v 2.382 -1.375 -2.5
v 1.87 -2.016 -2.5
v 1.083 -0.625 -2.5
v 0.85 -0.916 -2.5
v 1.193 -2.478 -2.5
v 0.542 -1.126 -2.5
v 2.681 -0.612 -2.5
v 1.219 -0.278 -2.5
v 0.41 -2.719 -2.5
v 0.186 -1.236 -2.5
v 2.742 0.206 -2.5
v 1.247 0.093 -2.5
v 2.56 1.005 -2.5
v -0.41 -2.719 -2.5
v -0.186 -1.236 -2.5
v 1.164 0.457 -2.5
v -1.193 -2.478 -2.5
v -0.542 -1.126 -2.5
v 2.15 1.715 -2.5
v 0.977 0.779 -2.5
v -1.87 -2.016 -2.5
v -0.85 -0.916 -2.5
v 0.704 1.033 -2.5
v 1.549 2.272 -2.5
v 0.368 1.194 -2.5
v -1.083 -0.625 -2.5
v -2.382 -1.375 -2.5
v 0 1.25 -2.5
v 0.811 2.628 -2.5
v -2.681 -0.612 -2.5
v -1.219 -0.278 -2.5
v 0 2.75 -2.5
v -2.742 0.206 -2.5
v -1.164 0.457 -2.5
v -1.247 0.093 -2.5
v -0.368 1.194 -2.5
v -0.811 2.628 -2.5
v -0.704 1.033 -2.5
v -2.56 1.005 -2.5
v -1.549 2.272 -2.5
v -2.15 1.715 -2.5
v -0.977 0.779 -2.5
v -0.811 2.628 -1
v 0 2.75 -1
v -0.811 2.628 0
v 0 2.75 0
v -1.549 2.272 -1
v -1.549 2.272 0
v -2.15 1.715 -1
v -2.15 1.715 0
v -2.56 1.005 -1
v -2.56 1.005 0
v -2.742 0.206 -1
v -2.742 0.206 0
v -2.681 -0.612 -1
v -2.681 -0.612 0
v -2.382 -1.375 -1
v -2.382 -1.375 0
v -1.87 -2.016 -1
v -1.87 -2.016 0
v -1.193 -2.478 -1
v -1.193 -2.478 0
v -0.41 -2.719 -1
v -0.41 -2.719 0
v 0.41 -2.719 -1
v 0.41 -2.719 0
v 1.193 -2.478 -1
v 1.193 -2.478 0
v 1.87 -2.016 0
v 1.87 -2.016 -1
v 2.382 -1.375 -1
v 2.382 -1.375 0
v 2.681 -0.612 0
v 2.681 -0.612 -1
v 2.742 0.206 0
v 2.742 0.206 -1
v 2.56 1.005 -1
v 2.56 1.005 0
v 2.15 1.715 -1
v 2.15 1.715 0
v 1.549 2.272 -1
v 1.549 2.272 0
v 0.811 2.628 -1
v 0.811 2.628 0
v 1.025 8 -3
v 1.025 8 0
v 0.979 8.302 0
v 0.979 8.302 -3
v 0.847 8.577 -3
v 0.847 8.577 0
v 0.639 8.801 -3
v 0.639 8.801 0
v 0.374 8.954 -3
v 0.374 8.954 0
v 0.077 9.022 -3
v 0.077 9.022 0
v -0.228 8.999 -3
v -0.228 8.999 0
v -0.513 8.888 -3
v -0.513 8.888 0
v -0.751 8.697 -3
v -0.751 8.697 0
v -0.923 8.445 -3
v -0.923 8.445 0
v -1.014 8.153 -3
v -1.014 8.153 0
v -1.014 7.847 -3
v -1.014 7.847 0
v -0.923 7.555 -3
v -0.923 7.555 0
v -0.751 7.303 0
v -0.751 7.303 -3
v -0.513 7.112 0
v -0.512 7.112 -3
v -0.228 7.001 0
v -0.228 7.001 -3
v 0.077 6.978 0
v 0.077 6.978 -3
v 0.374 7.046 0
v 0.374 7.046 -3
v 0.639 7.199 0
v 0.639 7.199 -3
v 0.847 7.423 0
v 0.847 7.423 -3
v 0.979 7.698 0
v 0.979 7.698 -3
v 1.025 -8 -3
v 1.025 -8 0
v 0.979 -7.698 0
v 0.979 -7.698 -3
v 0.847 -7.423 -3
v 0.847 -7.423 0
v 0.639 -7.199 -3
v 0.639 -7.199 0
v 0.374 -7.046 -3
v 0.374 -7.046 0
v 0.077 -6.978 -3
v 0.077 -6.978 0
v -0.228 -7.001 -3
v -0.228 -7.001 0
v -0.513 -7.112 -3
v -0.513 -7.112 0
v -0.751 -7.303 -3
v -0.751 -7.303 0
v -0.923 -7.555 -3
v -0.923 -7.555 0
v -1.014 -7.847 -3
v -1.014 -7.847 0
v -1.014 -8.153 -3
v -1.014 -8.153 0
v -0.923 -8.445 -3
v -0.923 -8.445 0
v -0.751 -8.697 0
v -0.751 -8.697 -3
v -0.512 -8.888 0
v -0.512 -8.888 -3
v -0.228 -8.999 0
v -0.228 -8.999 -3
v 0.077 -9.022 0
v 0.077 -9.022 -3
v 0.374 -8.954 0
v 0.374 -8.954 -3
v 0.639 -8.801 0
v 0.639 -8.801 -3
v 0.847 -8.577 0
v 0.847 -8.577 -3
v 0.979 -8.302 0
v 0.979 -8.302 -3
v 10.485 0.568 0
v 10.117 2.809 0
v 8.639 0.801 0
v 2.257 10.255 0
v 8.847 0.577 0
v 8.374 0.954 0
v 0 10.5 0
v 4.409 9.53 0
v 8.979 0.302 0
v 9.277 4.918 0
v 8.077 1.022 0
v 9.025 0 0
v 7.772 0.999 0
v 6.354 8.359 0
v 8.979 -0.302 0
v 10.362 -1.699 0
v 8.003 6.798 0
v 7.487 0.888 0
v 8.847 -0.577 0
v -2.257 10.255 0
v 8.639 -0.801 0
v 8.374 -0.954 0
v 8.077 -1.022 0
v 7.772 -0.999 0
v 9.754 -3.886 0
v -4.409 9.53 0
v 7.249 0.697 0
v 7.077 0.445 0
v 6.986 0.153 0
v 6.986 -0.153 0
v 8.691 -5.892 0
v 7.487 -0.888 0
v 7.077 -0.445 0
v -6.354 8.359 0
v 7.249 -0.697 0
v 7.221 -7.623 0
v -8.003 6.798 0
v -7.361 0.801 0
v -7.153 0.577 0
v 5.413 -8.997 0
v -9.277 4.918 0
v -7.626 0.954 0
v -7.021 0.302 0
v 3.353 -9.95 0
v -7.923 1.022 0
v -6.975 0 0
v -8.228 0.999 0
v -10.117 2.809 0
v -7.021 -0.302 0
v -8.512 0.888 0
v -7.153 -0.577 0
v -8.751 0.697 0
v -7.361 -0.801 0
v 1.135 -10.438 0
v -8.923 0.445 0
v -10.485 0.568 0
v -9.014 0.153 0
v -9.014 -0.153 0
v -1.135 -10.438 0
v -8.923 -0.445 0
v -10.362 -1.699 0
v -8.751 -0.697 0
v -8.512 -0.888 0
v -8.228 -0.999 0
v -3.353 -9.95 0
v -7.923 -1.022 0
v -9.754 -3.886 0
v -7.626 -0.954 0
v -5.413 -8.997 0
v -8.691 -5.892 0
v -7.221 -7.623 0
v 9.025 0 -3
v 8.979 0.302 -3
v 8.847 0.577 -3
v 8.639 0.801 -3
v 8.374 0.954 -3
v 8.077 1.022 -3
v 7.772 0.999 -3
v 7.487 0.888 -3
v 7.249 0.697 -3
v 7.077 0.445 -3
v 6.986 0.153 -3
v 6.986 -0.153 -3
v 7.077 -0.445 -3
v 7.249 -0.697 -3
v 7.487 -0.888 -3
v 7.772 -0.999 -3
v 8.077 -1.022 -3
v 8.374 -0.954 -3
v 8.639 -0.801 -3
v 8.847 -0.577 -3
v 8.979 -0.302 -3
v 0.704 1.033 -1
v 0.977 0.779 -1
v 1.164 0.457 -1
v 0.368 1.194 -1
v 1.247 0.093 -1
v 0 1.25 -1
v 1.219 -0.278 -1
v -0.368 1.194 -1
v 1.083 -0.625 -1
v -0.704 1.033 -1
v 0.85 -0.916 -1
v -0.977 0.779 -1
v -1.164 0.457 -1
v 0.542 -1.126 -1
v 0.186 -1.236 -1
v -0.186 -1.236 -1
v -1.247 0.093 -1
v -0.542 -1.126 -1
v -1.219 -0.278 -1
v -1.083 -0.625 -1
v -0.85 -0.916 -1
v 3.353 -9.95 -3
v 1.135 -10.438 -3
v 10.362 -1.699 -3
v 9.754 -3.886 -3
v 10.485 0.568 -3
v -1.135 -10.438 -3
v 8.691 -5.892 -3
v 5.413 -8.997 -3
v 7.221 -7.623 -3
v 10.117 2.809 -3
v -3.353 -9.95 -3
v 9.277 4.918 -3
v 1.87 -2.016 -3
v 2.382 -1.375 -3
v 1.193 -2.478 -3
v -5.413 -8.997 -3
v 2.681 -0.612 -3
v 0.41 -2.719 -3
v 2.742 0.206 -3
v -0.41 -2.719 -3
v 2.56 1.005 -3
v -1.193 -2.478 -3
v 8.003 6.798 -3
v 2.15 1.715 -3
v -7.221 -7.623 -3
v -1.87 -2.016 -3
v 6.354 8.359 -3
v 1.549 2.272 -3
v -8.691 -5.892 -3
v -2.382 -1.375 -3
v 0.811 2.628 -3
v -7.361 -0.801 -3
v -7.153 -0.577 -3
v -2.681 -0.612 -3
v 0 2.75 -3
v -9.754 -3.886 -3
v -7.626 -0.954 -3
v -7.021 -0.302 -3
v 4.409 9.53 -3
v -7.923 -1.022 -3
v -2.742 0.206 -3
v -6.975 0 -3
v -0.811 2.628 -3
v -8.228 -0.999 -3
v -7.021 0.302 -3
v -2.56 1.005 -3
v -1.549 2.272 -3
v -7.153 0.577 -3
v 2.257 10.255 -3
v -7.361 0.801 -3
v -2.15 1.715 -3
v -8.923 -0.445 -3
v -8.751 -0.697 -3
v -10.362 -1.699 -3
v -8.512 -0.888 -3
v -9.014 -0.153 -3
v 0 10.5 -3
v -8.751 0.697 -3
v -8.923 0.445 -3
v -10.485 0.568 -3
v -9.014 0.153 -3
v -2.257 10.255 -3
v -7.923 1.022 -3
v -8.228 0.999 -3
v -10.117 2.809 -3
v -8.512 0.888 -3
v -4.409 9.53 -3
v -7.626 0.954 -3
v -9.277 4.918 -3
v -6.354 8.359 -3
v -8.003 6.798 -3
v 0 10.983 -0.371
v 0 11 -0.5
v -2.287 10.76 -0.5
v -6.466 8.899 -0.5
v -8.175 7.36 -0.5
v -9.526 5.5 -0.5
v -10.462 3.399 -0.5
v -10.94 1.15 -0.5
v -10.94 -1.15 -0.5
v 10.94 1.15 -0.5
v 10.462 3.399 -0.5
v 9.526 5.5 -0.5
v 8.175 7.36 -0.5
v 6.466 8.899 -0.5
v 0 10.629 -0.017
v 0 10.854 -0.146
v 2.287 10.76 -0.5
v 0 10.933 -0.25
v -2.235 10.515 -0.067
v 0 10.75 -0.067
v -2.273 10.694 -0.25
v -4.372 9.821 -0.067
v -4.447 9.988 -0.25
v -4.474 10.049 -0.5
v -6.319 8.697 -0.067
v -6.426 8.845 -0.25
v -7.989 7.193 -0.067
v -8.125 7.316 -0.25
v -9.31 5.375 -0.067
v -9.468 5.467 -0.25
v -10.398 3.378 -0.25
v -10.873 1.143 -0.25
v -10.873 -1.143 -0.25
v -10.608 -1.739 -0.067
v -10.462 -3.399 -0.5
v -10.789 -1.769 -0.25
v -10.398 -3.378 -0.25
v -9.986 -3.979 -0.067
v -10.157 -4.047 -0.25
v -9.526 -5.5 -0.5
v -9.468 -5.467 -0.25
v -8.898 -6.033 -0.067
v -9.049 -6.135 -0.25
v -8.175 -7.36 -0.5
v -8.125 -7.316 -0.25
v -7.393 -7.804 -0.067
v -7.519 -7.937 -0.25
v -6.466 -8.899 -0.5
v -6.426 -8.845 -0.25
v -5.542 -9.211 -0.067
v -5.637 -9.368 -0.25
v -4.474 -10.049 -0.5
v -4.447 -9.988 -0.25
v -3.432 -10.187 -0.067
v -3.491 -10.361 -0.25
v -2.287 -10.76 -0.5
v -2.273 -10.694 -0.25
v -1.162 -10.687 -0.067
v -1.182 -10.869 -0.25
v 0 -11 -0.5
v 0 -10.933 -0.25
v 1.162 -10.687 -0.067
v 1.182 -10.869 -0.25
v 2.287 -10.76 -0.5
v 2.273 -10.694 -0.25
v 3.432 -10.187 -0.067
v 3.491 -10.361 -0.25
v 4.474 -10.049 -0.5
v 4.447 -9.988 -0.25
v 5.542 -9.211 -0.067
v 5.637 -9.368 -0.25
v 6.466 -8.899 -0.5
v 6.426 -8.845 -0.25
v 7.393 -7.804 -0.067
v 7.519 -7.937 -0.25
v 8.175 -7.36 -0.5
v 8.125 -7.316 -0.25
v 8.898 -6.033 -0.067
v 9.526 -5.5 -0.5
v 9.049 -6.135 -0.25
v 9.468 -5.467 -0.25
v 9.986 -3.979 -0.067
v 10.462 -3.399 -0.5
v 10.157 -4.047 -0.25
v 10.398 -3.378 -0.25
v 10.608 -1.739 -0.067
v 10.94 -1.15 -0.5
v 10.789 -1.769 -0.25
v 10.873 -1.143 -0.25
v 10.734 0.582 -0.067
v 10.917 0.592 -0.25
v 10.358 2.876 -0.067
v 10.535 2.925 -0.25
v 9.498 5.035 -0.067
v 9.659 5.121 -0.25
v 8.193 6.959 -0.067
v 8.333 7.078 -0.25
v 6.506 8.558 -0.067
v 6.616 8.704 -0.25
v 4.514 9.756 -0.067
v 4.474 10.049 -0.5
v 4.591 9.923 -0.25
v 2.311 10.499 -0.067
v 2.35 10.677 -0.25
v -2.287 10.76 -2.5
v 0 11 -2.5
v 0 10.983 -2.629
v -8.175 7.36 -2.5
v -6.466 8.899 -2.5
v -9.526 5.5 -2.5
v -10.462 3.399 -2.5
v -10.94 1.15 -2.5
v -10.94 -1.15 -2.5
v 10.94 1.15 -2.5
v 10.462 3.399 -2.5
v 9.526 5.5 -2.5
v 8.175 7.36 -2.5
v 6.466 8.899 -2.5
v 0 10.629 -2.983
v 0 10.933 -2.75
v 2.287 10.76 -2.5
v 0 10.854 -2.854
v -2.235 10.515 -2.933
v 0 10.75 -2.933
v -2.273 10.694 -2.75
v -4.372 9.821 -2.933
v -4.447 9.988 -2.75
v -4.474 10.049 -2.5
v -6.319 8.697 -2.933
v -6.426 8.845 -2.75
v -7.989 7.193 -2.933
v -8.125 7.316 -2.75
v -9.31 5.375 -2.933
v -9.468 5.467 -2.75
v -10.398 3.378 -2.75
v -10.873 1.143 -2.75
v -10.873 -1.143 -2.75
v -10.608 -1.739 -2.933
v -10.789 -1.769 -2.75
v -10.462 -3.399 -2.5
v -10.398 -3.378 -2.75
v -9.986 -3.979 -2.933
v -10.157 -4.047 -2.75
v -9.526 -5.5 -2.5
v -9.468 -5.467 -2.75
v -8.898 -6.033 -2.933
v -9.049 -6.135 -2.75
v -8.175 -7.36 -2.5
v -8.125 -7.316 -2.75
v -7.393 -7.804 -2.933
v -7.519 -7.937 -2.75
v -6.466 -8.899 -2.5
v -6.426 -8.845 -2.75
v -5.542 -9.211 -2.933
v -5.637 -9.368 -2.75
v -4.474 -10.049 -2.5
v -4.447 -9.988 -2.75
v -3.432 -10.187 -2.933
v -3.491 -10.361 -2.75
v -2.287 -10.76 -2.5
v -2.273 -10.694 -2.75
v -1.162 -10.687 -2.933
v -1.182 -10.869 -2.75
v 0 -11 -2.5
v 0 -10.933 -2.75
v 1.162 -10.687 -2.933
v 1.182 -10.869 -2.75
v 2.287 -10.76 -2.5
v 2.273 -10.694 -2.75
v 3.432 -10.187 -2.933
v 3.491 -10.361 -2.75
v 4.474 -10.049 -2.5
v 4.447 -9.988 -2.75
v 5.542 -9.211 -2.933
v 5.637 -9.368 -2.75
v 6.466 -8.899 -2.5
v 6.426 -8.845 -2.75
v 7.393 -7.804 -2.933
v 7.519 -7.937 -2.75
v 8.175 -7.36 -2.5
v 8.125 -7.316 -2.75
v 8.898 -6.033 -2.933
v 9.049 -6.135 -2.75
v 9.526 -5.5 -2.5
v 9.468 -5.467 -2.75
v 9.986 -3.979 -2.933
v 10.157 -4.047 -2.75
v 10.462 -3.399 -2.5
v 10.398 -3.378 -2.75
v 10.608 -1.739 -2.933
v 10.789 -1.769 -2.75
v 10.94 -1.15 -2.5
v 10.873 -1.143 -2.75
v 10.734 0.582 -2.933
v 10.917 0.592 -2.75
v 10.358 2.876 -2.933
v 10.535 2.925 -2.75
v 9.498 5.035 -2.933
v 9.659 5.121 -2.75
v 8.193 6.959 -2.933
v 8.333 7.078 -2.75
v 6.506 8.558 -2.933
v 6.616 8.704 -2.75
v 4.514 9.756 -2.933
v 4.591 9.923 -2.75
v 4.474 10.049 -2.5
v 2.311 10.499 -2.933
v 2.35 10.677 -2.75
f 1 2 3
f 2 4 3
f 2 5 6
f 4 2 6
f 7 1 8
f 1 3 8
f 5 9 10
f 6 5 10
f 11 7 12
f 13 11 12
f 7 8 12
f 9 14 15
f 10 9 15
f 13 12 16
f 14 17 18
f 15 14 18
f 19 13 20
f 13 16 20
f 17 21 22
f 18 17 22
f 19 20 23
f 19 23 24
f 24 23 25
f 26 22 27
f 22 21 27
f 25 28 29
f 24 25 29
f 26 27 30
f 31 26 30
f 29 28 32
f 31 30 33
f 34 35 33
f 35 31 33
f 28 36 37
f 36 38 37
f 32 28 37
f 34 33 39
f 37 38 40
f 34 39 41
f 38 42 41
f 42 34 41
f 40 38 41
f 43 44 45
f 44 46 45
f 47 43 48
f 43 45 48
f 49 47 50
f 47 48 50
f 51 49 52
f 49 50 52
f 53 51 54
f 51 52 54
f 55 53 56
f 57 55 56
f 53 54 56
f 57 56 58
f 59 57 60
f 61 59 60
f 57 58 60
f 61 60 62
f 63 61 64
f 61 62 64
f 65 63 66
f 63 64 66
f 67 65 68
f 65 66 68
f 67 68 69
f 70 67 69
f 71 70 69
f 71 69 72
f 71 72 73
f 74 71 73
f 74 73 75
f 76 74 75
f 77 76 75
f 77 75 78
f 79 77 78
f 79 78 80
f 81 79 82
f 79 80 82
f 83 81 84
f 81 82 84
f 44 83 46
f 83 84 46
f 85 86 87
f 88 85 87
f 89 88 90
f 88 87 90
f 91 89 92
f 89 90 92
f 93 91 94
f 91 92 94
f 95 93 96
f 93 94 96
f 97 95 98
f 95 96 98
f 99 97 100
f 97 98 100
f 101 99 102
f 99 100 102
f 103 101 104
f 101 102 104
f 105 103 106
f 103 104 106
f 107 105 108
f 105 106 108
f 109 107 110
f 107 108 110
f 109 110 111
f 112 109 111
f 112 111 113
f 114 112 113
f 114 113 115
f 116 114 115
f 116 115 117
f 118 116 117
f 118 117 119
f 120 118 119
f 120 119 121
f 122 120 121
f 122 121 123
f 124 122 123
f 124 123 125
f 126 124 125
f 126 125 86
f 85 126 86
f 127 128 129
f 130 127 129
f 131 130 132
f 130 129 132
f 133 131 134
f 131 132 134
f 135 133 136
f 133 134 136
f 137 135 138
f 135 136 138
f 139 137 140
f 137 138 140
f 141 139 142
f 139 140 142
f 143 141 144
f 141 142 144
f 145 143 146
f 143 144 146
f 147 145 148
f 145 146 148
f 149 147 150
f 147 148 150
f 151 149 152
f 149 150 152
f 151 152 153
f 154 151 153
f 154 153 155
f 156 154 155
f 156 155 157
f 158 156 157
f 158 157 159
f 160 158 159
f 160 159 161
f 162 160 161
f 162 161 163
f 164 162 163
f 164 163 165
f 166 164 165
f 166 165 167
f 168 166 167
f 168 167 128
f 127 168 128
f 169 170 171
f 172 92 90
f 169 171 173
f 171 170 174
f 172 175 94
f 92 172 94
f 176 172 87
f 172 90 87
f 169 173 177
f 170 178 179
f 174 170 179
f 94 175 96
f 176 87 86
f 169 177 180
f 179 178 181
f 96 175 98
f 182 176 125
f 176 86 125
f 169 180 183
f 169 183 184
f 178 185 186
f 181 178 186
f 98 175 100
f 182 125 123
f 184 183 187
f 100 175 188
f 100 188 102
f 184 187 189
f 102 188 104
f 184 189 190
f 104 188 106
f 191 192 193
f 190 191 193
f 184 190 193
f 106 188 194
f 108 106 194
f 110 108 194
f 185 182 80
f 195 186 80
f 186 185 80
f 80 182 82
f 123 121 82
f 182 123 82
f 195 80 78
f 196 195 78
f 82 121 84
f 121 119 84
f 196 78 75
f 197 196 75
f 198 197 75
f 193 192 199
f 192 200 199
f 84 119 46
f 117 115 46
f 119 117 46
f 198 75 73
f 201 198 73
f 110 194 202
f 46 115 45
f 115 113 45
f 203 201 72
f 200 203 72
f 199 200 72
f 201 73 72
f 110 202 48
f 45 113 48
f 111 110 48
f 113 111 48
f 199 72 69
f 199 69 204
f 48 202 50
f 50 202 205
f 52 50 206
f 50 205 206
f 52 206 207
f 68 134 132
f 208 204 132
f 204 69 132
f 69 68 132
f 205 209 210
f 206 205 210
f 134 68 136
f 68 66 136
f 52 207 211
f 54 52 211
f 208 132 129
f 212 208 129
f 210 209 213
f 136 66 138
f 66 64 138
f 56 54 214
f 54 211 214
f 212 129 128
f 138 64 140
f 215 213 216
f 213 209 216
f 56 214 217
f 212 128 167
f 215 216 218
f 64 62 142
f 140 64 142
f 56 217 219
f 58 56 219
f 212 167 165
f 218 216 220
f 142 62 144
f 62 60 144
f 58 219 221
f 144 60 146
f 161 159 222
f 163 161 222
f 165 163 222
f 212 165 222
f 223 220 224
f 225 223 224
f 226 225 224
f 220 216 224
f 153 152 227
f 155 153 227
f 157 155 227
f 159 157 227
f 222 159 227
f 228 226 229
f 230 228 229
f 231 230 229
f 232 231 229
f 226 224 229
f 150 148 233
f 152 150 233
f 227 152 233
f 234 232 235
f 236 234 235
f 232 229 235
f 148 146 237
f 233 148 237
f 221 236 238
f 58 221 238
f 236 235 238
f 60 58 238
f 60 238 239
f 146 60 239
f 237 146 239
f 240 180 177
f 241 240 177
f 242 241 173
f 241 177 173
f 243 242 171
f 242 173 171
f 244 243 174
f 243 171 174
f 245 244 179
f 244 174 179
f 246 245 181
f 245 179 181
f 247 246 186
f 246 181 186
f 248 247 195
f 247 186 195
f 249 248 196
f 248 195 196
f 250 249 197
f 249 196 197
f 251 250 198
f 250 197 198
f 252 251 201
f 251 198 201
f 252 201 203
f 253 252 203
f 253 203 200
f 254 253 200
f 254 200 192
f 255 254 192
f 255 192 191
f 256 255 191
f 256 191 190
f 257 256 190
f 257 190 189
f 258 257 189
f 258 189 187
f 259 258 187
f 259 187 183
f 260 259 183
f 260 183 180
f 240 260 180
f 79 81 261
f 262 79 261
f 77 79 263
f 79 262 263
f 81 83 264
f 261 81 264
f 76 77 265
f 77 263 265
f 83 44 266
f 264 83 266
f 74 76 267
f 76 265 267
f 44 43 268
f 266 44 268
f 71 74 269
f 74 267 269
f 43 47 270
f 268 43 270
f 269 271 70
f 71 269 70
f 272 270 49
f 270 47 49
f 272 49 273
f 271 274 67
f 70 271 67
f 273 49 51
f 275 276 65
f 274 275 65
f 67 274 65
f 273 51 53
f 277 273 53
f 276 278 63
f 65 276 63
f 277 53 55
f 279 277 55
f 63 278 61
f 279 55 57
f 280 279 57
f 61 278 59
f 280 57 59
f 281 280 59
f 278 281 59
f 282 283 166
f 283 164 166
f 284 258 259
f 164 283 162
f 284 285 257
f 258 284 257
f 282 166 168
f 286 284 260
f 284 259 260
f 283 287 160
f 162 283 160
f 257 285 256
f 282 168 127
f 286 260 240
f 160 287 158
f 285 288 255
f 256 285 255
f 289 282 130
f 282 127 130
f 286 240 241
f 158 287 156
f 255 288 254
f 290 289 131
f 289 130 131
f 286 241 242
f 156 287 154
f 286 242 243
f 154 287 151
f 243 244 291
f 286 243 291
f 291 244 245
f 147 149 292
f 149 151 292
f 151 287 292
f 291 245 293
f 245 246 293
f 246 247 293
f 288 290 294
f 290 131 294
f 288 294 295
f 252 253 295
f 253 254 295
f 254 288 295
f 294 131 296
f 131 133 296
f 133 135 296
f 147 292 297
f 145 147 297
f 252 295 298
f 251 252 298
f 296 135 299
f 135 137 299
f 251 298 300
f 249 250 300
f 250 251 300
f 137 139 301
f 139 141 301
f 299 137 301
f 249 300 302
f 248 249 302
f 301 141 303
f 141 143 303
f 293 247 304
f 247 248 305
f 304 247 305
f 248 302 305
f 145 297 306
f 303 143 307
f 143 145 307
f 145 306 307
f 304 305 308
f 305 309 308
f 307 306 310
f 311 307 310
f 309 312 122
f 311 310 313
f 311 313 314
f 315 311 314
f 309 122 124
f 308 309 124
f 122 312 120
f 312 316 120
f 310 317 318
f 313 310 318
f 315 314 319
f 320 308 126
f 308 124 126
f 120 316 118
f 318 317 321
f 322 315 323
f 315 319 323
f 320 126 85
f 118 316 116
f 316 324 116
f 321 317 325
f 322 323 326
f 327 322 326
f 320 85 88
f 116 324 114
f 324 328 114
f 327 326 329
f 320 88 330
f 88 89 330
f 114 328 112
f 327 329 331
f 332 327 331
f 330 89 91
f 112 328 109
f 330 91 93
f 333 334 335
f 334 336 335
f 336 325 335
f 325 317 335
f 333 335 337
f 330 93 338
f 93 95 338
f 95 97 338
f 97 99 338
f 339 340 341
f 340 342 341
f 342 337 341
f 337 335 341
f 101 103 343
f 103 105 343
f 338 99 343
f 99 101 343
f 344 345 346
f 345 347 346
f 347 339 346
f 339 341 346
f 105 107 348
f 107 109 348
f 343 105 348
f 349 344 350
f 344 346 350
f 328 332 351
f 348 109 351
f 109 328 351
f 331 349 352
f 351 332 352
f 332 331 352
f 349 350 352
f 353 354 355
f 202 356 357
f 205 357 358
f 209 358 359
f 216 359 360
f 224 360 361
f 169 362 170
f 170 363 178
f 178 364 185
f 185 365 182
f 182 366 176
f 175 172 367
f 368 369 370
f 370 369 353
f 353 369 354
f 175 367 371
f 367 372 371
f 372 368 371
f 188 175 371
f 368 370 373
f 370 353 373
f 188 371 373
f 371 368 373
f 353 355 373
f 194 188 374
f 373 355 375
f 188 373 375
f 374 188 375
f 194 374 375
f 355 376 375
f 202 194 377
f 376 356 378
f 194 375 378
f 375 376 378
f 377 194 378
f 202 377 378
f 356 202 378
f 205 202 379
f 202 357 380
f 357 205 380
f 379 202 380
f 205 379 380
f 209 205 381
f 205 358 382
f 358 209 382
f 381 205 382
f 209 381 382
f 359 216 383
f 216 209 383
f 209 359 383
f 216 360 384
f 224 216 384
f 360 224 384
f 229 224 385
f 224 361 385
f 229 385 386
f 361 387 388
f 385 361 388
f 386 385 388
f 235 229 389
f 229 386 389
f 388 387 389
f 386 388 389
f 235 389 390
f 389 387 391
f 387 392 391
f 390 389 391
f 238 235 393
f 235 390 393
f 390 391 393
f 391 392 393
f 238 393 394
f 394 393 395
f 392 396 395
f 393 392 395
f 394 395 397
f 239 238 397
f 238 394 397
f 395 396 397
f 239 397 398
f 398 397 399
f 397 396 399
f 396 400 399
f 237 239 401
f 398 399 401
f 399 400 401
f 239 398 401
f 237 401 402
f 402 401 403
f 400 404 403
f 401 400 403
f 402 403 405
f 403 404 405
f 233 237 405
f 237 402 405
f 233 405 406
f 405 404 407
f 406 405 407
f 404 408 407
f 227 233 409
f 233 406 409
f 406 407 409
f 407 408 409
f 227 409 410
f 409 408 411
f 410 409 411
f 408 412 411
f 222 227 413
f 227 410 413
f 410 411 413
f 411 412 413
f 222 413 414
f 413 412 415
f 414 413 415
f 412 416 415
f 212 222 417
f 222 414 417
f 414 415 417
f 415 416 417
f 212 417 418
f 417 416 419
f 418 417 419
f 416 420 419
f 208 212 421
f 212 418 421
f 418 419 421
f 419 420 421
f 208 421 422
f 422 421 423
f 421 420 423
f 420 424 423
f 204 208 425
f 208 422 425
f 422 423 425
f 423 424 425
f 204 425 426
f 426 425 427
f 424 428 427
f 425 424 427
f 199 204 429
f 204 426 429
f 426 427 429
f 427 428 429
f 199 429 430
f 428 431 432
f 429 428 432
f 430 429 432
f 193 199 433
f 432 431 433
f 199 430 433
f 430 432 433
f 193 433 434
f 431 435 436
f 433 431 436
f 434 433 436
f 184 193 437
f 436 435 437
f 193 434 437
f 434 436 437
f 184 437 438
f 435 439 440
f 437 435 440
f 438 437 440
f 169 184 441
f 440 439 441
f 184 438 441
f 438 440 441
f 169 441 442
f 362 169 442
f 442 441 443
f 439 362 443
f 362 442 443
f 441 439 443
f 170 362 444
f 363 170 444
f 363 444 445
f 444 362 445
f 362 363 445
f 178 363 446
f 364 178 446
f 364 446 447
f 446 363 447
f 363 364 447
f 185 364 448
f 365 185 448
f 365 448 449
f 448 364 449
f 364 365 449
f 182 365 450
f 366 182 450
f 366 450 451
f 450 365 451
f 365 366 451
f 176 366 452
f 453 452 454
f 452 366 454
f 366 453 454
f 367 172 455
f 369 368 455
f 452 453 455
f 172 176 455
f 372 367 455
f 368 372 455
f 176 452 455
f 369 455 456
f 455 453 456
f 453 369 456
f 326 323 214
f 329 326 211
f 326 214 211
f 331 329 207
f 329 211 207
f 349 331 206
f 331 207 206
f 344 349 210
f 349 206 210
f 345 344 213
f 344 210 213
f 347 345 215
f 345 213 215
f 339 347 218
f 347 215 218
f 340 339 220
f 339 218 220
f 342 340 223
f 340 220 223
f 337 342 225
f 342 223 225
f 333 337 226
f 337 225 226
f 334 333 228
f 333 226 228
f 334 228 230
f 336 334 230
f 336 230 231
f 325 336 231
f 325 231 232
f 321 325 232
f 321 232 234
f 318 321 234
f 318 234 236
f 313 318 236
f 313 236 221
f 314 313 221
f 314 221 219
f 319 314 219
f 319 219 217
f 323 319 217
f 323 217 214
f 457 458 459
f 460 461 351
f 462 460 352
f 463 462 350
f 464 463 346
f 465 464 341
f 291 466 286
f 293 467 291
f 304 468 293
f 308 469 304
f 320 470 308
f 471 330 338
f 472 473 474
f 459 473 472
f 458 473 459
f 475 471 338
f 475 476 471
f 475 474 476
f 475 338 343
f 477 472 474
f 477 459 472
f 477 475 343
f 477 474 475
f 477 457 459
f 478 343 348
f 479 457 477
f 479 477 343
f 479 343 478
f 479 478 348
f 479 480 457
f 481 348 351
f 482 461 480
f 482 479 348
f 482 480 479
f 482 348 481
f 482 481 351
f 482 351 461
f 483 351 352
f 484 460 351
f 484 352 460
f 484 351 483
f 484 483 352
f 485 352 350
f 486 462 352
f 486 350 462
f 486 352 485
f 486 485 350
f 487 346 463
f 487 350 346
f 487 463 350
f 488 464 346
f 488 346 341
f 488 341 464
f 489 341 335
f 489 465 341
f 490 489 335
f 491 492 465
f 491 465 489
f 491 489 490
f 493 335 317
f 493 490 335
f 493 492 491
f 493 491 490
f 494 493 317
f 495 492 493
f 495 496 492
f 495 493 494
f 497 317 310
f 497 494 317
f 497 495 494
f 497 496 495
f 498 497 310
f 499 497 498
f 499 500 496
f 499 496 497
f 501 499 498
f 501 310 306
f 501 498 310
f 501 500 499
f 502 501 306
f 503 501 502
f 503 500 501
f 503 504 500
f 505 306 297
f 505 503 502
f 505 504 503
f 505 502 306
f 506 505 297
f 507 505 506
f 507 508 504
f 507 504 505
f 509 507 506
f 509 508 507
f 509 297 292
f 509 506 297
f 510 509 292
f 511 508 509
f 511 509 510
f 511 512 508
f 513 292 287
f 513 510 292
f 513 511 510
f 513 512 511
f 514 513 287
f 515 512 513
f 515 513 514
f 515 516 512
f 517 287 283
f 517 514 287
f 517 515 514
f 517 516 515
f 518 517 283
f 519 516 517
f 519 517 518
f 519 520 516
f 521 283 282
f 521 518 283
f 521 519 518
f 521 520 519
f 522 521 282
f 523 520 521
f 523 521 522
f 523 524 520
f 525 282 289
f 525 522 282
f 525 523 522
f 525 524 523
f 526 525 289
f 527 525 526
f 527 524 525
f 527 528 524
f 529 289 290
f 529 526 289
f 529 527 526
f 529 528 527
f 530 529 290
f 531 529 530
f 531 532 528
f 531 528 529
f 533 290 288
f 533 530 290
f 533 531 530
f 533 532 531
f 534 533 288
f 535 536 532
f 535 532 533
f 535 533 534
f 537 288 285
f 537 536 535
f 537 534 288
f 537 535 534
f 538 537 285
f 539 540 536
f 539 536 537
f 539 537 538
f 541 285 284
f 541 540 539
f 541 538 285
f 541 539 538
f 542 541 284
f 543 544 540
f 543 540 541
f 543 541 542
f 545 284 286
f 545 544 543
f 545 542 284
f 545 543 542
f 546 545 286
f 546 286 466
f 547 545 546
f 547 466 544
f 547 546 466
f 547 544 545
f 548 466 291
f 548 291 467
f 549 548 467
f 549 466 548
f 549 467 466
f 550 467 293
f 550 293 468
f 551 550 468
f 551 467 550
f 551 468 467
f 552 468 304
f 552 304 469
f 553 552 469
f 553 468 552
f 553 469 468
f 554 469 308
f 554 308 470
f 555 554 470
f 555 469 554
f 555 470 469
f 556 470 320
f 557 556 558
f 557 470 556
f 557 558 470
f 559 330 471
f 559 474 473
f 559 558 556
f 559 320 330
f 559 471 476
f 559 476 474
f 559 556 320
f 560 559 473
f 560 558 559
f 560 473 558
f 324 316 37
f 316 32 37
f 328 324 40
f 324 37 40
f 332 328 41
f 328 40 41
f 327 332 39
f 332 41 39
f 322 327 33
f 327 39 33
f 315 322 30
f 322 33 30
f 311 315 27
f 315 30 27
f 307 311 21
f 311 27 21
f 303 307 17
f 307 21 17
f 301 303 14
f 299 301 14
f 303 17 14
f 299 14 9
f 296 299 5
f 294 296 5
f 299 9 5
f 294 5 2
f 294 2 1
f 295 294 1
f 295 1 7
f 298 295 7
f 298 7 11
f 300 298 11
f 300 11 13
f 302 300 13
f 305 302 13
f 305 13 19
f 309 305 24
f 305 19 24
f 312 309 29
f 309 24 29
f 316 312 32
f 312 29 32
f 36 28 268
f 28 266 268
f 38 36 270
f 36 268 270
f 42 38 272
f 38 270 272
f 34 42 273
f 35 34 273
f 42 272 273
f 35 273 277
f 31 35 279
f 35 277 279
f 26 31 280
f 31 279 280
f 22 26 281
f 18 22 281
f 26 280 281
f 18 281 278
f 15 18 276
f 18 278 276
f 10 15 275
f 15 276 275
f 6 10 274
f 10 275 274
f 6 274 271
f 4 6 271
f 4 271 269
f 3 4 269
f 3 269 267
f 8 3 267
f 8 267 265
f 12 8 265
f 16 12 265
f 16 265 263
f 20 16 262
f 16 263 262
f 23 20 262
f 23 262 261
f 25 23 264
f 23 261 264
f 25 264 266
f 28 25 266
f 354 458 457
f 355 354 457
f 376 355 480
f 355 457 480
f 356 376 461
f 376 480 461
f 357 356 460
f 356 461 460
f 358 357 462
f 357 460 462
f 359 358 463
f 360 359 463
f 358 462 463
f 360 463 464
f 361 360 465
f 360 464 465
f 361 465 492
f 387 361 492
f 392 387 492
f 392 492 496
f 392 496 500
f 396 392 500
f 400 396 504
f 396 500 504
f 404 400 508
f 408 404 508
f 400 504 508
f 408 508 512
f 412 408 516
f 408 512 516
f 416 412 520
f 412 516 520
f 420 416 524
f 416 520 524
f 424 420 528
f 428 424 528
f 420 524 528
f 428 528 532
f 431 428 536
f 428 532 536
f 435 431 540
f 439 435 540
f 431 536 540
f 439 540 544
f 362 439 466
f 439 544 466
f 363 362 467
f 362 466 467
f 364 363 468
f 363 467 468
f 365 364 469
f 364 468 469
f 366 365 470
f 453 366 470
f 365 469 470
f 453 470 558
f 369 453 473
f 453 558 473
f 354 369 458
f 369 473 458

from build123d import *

# Parameters (mm, degrees)
M2_TAPPED_HOLE1_AT_2_COUNT = 2
M2_TAPPED_HOLE1_AT_2_PITCH = 11.313708499
M2_TAPPED_HOLE1_AT_3_COUNT = 2
M2_TAPPED_HOLE1_AT_3_PITCH = 16
M2_TAPPED_HOLE1_AT_4_COUNT = 2
M2_TAPPED_HOLE1_AT_4_PITCH = 11.313708499
M2_TAPPED_HOLE1_AT_5_COUNT = 2
M2_TAPPED_HOLE1_AT_5_PITCH = 8
RADYUS1_R                  = 0.5
IZIM1_R                    = 1.025
KES_EKSTR_ZYON1_DEPTH      = 10


with BuildPart() as part:
    # Sketch1 → Revolve1 (revolve)
    with BuildSketch(Plane(origin=(0, 0, 0), x_dir=(0, 0, -1), z_dir=(1, 0, 0))):
        Polygon((2.5, 1.25), (1, 1.25), (1, 2.75), (0, 2.75), (0, 11), (3, 11), (3, 2.75), (2.5, 2.75), align=None)
    revolve(axis=Axis((0, 0, 0), (0, 0, 1)))

    # Sketch4 → M2 Tapped Hole1 (revolve, cut)
    with BuildSketch(Plane(origin=(0, 8, 0), x_dir=(0, -1, 0), z_dir=(1, 0, 0))):
        Polygon((0, 0), (0, 3), (1.025, 3), (0.8, 2.870096189), (0.8, 0.129903811), (1.025, 0), align=None)
    m2_tapped_hole1 = revolve(axis=Axis((0, 8, 6.35), (0, 0, -1)), mode=Mode.SUBTRACT)

    # M2 Tapped Hole1 at 2: M2 Tapped Hole1 ×2
    with Locations(*[Vector(0.707106781, -0.707106781, 0) * (i * M2_TAPPED_HOLE1_AT_2_PITCH) for i in range(1, M2_TAPPED_HOLE1_AT_2_COUNT)]):
        add(m2_tapped_hole1, mode=Mode.SUBTRACT)

    # M2 Tapped Hole1 at 3: M2 Tapped Hole1 ×2
    with Locations(*[(0, -i * M2_TAPPED_HOLE1_AT_3_PITCH, 0) for i in range(1, M2_TAPPED_HOLE1_AT_3_COUNT)]):
        add(m2_tapped_hole1, mode=Mode.SUBTRACT)

    # M2 Tapped Hole1 at 4: M2 Tapped Hole1 ×2
    with Locations(*[Vector(-0.707106781, -0.707106781, 0) * (i * M2_TAPPED_HOLE1_AT_4_PITCH) for i in range(1, M2_TAPPED_HOLE1_AT_4_COUNT)]):
        add(m2_tapped_hole1, mode=Mode.SUBTRACT)

    # M2 Tapped Hole1 at 5: M2 Tapped Hole1 ×2
    with Locations(*[(0, -i * M2_TAPPED_HOLE1_AT_5_PITCH, 0) for i in range(1, M2_TAPPED_HOLE1_AT_5_COUNT)]):
        add(m2_tapped_hole1, mode=Mode.SUBTRACT)

    # Radyus1
    radyus1_edges = [part.edges().sort_by_distance(p)[0] for p in [
        (0, -11, -3),
        (0, -11, 0),
    ]]
    fillet(radyus1_edges, radius=RADYUS1_R)

    # Çizim1 → Kes-Ekstrüzyon1 (cut)
    with BuildSketch(Plane.XY):
        with Locations((0, 8)):
            Circle(IZIM1_R)
        with Locations((-8, 0)):
            Circle(IZIM1_R)
        with Locations((8, 0)):
            Circle(IZIM1_R)
        with Locations((0, -8)):
            Circle(IZIM1_R)
    extrude(amount=-KES_EKSTR_ZYON1_DEPTH, mode=Mode.SUBTRACT)


solid = part.part
